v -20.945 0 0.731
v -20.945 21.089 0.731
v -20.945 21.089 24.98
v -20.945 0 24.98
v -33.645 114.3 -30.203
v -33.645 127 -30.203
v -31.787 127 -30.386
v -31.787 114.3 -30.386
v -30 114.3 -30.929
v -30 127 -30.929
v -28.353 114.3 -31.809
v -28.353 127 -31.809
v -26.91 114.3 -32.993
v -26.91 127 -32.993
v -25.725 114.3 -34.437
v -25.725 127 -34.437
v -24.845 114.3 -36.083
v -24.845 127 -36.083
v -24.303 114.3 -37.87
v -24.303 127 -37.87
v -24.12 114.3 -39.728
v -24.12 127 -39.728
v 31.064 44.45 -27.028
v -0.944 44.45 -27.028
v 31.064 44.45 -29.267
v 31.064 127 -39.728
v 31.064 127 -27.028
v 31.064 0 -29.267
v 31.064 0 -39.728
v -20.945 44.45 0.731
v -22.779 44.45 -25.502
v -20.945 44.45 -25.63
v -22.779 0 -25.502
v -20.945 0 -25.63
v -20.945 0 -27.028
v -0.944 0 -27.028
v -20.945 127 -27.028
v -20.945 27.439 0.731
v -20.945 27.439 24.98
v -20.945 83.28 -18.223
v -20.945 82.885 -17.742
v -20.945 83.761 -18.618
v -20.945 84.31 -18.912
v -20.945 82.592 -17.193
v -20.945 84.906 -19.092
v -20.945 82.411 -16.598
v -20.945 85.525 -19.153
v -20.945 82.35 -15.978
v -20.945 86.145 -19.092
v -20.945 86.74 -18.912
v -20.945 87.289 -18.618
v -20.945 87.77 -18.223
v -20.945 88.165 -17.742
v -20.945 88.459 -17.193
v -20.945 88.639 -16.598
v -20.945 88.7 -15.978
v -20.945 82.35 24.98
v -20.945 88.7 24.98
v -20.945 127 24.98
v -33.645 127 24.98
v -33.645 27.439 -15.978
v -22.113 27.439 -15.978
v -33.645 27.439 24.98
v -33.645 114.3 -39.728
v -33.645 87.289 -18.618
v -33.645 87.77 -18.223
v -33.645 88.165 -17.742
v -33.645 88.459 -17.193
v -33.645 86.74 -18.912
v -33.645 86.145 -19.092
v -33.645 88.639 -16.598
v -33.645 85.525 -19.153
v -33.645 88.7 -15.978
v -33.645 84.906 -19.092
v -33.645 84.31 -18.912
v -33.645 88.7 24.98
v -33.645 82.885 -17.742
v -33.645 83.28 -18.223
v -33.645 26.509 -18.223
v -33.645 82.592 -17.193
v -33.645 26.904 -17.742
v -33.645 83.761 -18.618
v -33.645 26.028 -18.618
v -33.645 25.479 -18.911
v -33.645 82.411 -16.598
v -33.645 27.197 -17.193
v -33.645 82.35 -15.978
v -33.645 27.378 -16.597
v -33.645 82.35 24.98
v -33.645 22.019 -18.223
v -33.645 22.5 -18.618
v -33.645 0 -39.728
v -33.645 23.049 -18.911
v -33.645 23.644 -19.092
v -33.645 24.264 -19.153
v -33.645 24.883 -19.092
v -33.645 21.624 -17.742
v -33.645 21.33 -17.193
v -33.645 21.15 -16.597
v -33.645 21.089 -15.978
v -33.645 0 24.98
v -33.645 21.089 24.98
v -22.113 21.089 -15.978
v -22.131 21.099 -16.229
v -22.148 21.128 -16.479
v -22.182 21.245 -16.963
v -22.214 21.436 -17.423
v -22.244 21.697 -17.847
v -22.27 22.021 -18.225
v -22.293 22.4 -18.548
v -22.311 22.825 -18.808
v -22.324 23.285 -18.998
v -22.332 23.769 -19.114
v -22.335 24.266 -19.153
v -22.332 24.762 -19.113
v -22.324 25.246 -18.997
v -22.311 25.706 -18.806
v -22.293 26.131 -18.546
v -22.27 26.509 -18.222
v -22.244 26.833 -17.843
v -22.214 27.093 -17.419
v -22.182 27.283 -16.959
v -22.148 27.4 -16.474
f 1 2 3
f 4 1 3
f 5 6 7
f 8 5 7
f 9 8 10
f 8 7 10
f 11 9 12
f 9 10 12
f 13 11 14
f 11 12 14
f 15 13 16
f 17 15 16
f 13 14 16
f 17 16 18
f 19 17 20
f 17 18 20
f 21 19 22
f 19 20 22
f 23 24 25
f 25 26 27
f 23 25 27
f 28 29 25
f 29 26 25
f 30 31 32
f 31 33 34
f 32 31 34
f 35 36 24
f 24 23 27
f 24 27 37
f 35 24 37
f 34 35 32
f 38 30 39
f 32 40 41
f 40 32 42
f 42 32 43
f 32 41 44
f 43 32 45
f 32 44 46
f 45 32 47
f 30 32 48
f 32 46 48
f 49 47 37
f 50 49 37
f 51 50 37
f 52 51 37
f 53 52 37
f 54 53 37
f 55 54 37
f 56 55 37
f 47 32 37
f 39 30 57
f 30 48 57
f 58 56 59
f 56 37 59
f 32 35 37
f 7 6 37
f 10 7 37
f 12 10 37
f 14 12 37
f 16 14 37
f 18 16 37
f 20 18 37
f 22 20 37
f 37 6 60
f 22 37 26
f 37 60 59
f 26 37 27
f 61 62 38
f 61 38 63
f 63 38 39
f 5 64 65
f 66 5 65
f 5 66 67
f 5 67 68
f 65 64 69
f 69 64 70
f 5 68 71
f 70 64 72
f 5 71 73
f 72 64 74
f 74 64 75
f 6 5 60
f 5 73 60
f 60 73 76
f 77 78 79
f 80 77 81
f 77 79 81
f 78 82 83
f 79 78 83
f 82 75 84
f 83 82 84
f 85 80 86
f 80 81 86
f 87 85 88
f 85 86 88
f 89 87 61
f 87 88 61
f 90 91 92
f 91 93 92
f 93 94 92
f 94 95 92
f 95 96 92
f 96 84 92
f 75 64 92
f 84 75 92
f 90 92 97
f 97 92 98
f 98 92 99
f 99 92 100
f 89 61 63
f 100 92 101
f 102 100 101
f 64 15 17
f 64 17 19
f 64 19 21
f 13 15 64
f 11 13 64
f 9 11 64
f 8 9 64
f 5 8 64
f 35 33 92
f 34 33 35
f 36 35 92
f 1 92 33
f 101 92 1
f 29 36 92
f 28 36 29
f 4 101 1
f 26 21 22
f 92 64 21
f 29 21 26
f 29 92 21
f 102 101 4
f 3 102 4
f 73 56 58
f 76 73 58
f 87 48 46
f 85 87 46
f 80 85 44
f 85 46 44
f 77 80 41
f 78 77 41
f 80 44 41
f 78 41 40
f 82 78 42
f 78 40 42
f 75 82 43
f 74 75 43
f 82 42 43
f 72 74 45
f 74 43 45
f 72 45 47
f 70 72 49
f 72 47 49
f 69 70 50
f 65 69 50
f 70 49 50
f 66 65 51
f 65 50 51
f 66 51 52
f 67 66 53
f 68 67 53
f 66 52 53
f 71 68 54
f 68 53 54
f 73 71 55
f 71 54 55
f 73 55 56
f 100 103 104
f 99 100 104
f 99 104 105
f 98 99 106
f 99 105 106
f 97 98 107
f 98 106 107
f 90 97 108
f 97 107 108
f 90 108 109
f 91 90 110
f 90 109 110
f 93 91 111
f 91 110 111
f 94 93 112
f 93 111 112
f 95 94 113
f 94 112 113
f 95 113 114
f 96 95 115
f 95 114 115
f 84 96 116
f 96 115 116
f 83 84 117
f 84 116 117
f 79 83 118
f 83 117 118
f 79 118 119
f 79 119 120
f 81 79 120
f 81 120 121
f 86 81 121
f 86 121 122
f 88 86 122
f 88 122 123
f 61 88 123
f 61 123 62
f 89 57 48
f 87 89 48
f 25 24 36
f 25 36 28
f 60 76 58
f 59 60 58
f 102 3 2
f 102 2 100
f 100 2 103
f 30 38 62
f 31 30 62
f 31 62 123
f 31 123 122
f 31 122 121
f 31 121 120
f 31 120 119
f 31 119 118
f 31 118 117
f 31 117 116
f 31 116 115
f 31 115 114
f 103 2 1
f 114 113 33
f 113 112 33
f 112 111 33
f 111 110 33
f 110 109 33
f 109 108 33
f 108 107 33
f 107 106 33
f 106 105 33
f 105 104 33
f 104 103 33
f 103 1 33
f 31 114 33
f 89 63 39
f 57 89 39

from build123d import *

# Parameters (mm, degrees)
F0_W     = 64.7085476667
F0_H     = 64.7085476667
F1_DEPTH = 127
F2_W     = 52.0085476667
F2_H     = 52.0085476667
F3_DEPTH = 127.001
F5_DEPTH = 44.45
F6_W     = 6.35
F6_H     = 24.2487721393
F7_DEPTH = 12.701
F9_DEPTH = 12.7


# Not quite as in the source:
# - a feature names something its author has since deleted; it is built from what else it names


with BuildPart() as f1:
    # F0 (on Front) → F1 (new body)
    with BuildSketch(Plane.XZ):
        with Locations((-1.2904843315, -7.374192588)):
            Rectangle(F0_W, F0_H)
    extrude(amount=-F1_DEPTH)

    # F2 (on face) → F3 (cut, through all)
    with BuildSketch(Plane(origin=(0, 127, 0), x_dir=(-1, 0, 0), z_dir=(0, 1, 0))):
        with Locations((-5.0595156685, -1.024192588)):
            Rectangle(F2_W, F2_H)
    extrude(amount=-F3_DEPTH, mode=Mode.SUBTRACT)

    # F4 (on face) → F5 (cut)
    with BuildSketch(Plane.XZ):
        Polygon((31.0637895018, -27.0284664214), (-0.9437288021, -27.0284664214), (31.0637895018, -29.2666501498), align=None)
        Polygon((-20.9447581649, -25.6298581929), (-20.9447581649, 0.731309106), (-22.7791408762, -25.5015856572), align=None)
    extrude(amount=-F5_DEPTH, mode=Mode.SUBTRACT)

    # F6 (on face) → F7 (cut, through all)
    with BuildSketch(Plane.YZ.offset(-20.9447581649)):
        with Locations((24.2636220248, 12.8556951756)):
            Rectangle(F6_W, F6_H)
        with BuildLine():
            Line((27.4386220248, -15.9778556544), (27.4386220248, 0.731309106))
            Line((27.4386220248, 0.731309106), (21.0886220248, 0.731309106))
            Line((21.0886220248, 0.731309106), (21.0886220248, -15.9778556544))
            ThreePointArc((21.0886220248, -15.9778556544), (24.2636220248, -19.1528556544), (27.4386220248, -15.9778556544))
        make_face()
        with BuildLine():
            Line((88.7001905876, 24.9800812453), (82.3501905876, 24.9800812453))
            Line((82.3501905876, 24.9800812453), (82.3501905876, -15.9781904151))
            ThreePointArc((82.3501905876, -15.9781904151), (85.5251905876, -19.1531904151), (88.7001905876, -15.9781904151))
            Line((88.7001905876, -15.9781904151), (88.7001905876, 24.9800812453))
        make_face()
    extrude(amount=-F7_DEPTH, mode=Mode.SUBTRACT)

    # F8 (on face) → F9 (cut)
    with BuildSketch(Plane(origin=(0, 127, 0), x_dir=(-1, 0, 0), z_dir=(0, 1, 0))):
        with BuildLine():
            Line((33.6447581649, -39.7284664214), (33.6447581649, -30.2034664214))
            ThreePointArc((33.6447581649, -30.2034664214), (26.9095660741, -32.9932743306), (24.1197581649, -39.7284664214))
            Line((24.1197581649, -39.7284664214), (33.6447581649, -39.7284664214))
        make_face()
    extrude(amount=-F9_DEPTH, mode=Mode.SUBTRACT)


solid = f1.part
